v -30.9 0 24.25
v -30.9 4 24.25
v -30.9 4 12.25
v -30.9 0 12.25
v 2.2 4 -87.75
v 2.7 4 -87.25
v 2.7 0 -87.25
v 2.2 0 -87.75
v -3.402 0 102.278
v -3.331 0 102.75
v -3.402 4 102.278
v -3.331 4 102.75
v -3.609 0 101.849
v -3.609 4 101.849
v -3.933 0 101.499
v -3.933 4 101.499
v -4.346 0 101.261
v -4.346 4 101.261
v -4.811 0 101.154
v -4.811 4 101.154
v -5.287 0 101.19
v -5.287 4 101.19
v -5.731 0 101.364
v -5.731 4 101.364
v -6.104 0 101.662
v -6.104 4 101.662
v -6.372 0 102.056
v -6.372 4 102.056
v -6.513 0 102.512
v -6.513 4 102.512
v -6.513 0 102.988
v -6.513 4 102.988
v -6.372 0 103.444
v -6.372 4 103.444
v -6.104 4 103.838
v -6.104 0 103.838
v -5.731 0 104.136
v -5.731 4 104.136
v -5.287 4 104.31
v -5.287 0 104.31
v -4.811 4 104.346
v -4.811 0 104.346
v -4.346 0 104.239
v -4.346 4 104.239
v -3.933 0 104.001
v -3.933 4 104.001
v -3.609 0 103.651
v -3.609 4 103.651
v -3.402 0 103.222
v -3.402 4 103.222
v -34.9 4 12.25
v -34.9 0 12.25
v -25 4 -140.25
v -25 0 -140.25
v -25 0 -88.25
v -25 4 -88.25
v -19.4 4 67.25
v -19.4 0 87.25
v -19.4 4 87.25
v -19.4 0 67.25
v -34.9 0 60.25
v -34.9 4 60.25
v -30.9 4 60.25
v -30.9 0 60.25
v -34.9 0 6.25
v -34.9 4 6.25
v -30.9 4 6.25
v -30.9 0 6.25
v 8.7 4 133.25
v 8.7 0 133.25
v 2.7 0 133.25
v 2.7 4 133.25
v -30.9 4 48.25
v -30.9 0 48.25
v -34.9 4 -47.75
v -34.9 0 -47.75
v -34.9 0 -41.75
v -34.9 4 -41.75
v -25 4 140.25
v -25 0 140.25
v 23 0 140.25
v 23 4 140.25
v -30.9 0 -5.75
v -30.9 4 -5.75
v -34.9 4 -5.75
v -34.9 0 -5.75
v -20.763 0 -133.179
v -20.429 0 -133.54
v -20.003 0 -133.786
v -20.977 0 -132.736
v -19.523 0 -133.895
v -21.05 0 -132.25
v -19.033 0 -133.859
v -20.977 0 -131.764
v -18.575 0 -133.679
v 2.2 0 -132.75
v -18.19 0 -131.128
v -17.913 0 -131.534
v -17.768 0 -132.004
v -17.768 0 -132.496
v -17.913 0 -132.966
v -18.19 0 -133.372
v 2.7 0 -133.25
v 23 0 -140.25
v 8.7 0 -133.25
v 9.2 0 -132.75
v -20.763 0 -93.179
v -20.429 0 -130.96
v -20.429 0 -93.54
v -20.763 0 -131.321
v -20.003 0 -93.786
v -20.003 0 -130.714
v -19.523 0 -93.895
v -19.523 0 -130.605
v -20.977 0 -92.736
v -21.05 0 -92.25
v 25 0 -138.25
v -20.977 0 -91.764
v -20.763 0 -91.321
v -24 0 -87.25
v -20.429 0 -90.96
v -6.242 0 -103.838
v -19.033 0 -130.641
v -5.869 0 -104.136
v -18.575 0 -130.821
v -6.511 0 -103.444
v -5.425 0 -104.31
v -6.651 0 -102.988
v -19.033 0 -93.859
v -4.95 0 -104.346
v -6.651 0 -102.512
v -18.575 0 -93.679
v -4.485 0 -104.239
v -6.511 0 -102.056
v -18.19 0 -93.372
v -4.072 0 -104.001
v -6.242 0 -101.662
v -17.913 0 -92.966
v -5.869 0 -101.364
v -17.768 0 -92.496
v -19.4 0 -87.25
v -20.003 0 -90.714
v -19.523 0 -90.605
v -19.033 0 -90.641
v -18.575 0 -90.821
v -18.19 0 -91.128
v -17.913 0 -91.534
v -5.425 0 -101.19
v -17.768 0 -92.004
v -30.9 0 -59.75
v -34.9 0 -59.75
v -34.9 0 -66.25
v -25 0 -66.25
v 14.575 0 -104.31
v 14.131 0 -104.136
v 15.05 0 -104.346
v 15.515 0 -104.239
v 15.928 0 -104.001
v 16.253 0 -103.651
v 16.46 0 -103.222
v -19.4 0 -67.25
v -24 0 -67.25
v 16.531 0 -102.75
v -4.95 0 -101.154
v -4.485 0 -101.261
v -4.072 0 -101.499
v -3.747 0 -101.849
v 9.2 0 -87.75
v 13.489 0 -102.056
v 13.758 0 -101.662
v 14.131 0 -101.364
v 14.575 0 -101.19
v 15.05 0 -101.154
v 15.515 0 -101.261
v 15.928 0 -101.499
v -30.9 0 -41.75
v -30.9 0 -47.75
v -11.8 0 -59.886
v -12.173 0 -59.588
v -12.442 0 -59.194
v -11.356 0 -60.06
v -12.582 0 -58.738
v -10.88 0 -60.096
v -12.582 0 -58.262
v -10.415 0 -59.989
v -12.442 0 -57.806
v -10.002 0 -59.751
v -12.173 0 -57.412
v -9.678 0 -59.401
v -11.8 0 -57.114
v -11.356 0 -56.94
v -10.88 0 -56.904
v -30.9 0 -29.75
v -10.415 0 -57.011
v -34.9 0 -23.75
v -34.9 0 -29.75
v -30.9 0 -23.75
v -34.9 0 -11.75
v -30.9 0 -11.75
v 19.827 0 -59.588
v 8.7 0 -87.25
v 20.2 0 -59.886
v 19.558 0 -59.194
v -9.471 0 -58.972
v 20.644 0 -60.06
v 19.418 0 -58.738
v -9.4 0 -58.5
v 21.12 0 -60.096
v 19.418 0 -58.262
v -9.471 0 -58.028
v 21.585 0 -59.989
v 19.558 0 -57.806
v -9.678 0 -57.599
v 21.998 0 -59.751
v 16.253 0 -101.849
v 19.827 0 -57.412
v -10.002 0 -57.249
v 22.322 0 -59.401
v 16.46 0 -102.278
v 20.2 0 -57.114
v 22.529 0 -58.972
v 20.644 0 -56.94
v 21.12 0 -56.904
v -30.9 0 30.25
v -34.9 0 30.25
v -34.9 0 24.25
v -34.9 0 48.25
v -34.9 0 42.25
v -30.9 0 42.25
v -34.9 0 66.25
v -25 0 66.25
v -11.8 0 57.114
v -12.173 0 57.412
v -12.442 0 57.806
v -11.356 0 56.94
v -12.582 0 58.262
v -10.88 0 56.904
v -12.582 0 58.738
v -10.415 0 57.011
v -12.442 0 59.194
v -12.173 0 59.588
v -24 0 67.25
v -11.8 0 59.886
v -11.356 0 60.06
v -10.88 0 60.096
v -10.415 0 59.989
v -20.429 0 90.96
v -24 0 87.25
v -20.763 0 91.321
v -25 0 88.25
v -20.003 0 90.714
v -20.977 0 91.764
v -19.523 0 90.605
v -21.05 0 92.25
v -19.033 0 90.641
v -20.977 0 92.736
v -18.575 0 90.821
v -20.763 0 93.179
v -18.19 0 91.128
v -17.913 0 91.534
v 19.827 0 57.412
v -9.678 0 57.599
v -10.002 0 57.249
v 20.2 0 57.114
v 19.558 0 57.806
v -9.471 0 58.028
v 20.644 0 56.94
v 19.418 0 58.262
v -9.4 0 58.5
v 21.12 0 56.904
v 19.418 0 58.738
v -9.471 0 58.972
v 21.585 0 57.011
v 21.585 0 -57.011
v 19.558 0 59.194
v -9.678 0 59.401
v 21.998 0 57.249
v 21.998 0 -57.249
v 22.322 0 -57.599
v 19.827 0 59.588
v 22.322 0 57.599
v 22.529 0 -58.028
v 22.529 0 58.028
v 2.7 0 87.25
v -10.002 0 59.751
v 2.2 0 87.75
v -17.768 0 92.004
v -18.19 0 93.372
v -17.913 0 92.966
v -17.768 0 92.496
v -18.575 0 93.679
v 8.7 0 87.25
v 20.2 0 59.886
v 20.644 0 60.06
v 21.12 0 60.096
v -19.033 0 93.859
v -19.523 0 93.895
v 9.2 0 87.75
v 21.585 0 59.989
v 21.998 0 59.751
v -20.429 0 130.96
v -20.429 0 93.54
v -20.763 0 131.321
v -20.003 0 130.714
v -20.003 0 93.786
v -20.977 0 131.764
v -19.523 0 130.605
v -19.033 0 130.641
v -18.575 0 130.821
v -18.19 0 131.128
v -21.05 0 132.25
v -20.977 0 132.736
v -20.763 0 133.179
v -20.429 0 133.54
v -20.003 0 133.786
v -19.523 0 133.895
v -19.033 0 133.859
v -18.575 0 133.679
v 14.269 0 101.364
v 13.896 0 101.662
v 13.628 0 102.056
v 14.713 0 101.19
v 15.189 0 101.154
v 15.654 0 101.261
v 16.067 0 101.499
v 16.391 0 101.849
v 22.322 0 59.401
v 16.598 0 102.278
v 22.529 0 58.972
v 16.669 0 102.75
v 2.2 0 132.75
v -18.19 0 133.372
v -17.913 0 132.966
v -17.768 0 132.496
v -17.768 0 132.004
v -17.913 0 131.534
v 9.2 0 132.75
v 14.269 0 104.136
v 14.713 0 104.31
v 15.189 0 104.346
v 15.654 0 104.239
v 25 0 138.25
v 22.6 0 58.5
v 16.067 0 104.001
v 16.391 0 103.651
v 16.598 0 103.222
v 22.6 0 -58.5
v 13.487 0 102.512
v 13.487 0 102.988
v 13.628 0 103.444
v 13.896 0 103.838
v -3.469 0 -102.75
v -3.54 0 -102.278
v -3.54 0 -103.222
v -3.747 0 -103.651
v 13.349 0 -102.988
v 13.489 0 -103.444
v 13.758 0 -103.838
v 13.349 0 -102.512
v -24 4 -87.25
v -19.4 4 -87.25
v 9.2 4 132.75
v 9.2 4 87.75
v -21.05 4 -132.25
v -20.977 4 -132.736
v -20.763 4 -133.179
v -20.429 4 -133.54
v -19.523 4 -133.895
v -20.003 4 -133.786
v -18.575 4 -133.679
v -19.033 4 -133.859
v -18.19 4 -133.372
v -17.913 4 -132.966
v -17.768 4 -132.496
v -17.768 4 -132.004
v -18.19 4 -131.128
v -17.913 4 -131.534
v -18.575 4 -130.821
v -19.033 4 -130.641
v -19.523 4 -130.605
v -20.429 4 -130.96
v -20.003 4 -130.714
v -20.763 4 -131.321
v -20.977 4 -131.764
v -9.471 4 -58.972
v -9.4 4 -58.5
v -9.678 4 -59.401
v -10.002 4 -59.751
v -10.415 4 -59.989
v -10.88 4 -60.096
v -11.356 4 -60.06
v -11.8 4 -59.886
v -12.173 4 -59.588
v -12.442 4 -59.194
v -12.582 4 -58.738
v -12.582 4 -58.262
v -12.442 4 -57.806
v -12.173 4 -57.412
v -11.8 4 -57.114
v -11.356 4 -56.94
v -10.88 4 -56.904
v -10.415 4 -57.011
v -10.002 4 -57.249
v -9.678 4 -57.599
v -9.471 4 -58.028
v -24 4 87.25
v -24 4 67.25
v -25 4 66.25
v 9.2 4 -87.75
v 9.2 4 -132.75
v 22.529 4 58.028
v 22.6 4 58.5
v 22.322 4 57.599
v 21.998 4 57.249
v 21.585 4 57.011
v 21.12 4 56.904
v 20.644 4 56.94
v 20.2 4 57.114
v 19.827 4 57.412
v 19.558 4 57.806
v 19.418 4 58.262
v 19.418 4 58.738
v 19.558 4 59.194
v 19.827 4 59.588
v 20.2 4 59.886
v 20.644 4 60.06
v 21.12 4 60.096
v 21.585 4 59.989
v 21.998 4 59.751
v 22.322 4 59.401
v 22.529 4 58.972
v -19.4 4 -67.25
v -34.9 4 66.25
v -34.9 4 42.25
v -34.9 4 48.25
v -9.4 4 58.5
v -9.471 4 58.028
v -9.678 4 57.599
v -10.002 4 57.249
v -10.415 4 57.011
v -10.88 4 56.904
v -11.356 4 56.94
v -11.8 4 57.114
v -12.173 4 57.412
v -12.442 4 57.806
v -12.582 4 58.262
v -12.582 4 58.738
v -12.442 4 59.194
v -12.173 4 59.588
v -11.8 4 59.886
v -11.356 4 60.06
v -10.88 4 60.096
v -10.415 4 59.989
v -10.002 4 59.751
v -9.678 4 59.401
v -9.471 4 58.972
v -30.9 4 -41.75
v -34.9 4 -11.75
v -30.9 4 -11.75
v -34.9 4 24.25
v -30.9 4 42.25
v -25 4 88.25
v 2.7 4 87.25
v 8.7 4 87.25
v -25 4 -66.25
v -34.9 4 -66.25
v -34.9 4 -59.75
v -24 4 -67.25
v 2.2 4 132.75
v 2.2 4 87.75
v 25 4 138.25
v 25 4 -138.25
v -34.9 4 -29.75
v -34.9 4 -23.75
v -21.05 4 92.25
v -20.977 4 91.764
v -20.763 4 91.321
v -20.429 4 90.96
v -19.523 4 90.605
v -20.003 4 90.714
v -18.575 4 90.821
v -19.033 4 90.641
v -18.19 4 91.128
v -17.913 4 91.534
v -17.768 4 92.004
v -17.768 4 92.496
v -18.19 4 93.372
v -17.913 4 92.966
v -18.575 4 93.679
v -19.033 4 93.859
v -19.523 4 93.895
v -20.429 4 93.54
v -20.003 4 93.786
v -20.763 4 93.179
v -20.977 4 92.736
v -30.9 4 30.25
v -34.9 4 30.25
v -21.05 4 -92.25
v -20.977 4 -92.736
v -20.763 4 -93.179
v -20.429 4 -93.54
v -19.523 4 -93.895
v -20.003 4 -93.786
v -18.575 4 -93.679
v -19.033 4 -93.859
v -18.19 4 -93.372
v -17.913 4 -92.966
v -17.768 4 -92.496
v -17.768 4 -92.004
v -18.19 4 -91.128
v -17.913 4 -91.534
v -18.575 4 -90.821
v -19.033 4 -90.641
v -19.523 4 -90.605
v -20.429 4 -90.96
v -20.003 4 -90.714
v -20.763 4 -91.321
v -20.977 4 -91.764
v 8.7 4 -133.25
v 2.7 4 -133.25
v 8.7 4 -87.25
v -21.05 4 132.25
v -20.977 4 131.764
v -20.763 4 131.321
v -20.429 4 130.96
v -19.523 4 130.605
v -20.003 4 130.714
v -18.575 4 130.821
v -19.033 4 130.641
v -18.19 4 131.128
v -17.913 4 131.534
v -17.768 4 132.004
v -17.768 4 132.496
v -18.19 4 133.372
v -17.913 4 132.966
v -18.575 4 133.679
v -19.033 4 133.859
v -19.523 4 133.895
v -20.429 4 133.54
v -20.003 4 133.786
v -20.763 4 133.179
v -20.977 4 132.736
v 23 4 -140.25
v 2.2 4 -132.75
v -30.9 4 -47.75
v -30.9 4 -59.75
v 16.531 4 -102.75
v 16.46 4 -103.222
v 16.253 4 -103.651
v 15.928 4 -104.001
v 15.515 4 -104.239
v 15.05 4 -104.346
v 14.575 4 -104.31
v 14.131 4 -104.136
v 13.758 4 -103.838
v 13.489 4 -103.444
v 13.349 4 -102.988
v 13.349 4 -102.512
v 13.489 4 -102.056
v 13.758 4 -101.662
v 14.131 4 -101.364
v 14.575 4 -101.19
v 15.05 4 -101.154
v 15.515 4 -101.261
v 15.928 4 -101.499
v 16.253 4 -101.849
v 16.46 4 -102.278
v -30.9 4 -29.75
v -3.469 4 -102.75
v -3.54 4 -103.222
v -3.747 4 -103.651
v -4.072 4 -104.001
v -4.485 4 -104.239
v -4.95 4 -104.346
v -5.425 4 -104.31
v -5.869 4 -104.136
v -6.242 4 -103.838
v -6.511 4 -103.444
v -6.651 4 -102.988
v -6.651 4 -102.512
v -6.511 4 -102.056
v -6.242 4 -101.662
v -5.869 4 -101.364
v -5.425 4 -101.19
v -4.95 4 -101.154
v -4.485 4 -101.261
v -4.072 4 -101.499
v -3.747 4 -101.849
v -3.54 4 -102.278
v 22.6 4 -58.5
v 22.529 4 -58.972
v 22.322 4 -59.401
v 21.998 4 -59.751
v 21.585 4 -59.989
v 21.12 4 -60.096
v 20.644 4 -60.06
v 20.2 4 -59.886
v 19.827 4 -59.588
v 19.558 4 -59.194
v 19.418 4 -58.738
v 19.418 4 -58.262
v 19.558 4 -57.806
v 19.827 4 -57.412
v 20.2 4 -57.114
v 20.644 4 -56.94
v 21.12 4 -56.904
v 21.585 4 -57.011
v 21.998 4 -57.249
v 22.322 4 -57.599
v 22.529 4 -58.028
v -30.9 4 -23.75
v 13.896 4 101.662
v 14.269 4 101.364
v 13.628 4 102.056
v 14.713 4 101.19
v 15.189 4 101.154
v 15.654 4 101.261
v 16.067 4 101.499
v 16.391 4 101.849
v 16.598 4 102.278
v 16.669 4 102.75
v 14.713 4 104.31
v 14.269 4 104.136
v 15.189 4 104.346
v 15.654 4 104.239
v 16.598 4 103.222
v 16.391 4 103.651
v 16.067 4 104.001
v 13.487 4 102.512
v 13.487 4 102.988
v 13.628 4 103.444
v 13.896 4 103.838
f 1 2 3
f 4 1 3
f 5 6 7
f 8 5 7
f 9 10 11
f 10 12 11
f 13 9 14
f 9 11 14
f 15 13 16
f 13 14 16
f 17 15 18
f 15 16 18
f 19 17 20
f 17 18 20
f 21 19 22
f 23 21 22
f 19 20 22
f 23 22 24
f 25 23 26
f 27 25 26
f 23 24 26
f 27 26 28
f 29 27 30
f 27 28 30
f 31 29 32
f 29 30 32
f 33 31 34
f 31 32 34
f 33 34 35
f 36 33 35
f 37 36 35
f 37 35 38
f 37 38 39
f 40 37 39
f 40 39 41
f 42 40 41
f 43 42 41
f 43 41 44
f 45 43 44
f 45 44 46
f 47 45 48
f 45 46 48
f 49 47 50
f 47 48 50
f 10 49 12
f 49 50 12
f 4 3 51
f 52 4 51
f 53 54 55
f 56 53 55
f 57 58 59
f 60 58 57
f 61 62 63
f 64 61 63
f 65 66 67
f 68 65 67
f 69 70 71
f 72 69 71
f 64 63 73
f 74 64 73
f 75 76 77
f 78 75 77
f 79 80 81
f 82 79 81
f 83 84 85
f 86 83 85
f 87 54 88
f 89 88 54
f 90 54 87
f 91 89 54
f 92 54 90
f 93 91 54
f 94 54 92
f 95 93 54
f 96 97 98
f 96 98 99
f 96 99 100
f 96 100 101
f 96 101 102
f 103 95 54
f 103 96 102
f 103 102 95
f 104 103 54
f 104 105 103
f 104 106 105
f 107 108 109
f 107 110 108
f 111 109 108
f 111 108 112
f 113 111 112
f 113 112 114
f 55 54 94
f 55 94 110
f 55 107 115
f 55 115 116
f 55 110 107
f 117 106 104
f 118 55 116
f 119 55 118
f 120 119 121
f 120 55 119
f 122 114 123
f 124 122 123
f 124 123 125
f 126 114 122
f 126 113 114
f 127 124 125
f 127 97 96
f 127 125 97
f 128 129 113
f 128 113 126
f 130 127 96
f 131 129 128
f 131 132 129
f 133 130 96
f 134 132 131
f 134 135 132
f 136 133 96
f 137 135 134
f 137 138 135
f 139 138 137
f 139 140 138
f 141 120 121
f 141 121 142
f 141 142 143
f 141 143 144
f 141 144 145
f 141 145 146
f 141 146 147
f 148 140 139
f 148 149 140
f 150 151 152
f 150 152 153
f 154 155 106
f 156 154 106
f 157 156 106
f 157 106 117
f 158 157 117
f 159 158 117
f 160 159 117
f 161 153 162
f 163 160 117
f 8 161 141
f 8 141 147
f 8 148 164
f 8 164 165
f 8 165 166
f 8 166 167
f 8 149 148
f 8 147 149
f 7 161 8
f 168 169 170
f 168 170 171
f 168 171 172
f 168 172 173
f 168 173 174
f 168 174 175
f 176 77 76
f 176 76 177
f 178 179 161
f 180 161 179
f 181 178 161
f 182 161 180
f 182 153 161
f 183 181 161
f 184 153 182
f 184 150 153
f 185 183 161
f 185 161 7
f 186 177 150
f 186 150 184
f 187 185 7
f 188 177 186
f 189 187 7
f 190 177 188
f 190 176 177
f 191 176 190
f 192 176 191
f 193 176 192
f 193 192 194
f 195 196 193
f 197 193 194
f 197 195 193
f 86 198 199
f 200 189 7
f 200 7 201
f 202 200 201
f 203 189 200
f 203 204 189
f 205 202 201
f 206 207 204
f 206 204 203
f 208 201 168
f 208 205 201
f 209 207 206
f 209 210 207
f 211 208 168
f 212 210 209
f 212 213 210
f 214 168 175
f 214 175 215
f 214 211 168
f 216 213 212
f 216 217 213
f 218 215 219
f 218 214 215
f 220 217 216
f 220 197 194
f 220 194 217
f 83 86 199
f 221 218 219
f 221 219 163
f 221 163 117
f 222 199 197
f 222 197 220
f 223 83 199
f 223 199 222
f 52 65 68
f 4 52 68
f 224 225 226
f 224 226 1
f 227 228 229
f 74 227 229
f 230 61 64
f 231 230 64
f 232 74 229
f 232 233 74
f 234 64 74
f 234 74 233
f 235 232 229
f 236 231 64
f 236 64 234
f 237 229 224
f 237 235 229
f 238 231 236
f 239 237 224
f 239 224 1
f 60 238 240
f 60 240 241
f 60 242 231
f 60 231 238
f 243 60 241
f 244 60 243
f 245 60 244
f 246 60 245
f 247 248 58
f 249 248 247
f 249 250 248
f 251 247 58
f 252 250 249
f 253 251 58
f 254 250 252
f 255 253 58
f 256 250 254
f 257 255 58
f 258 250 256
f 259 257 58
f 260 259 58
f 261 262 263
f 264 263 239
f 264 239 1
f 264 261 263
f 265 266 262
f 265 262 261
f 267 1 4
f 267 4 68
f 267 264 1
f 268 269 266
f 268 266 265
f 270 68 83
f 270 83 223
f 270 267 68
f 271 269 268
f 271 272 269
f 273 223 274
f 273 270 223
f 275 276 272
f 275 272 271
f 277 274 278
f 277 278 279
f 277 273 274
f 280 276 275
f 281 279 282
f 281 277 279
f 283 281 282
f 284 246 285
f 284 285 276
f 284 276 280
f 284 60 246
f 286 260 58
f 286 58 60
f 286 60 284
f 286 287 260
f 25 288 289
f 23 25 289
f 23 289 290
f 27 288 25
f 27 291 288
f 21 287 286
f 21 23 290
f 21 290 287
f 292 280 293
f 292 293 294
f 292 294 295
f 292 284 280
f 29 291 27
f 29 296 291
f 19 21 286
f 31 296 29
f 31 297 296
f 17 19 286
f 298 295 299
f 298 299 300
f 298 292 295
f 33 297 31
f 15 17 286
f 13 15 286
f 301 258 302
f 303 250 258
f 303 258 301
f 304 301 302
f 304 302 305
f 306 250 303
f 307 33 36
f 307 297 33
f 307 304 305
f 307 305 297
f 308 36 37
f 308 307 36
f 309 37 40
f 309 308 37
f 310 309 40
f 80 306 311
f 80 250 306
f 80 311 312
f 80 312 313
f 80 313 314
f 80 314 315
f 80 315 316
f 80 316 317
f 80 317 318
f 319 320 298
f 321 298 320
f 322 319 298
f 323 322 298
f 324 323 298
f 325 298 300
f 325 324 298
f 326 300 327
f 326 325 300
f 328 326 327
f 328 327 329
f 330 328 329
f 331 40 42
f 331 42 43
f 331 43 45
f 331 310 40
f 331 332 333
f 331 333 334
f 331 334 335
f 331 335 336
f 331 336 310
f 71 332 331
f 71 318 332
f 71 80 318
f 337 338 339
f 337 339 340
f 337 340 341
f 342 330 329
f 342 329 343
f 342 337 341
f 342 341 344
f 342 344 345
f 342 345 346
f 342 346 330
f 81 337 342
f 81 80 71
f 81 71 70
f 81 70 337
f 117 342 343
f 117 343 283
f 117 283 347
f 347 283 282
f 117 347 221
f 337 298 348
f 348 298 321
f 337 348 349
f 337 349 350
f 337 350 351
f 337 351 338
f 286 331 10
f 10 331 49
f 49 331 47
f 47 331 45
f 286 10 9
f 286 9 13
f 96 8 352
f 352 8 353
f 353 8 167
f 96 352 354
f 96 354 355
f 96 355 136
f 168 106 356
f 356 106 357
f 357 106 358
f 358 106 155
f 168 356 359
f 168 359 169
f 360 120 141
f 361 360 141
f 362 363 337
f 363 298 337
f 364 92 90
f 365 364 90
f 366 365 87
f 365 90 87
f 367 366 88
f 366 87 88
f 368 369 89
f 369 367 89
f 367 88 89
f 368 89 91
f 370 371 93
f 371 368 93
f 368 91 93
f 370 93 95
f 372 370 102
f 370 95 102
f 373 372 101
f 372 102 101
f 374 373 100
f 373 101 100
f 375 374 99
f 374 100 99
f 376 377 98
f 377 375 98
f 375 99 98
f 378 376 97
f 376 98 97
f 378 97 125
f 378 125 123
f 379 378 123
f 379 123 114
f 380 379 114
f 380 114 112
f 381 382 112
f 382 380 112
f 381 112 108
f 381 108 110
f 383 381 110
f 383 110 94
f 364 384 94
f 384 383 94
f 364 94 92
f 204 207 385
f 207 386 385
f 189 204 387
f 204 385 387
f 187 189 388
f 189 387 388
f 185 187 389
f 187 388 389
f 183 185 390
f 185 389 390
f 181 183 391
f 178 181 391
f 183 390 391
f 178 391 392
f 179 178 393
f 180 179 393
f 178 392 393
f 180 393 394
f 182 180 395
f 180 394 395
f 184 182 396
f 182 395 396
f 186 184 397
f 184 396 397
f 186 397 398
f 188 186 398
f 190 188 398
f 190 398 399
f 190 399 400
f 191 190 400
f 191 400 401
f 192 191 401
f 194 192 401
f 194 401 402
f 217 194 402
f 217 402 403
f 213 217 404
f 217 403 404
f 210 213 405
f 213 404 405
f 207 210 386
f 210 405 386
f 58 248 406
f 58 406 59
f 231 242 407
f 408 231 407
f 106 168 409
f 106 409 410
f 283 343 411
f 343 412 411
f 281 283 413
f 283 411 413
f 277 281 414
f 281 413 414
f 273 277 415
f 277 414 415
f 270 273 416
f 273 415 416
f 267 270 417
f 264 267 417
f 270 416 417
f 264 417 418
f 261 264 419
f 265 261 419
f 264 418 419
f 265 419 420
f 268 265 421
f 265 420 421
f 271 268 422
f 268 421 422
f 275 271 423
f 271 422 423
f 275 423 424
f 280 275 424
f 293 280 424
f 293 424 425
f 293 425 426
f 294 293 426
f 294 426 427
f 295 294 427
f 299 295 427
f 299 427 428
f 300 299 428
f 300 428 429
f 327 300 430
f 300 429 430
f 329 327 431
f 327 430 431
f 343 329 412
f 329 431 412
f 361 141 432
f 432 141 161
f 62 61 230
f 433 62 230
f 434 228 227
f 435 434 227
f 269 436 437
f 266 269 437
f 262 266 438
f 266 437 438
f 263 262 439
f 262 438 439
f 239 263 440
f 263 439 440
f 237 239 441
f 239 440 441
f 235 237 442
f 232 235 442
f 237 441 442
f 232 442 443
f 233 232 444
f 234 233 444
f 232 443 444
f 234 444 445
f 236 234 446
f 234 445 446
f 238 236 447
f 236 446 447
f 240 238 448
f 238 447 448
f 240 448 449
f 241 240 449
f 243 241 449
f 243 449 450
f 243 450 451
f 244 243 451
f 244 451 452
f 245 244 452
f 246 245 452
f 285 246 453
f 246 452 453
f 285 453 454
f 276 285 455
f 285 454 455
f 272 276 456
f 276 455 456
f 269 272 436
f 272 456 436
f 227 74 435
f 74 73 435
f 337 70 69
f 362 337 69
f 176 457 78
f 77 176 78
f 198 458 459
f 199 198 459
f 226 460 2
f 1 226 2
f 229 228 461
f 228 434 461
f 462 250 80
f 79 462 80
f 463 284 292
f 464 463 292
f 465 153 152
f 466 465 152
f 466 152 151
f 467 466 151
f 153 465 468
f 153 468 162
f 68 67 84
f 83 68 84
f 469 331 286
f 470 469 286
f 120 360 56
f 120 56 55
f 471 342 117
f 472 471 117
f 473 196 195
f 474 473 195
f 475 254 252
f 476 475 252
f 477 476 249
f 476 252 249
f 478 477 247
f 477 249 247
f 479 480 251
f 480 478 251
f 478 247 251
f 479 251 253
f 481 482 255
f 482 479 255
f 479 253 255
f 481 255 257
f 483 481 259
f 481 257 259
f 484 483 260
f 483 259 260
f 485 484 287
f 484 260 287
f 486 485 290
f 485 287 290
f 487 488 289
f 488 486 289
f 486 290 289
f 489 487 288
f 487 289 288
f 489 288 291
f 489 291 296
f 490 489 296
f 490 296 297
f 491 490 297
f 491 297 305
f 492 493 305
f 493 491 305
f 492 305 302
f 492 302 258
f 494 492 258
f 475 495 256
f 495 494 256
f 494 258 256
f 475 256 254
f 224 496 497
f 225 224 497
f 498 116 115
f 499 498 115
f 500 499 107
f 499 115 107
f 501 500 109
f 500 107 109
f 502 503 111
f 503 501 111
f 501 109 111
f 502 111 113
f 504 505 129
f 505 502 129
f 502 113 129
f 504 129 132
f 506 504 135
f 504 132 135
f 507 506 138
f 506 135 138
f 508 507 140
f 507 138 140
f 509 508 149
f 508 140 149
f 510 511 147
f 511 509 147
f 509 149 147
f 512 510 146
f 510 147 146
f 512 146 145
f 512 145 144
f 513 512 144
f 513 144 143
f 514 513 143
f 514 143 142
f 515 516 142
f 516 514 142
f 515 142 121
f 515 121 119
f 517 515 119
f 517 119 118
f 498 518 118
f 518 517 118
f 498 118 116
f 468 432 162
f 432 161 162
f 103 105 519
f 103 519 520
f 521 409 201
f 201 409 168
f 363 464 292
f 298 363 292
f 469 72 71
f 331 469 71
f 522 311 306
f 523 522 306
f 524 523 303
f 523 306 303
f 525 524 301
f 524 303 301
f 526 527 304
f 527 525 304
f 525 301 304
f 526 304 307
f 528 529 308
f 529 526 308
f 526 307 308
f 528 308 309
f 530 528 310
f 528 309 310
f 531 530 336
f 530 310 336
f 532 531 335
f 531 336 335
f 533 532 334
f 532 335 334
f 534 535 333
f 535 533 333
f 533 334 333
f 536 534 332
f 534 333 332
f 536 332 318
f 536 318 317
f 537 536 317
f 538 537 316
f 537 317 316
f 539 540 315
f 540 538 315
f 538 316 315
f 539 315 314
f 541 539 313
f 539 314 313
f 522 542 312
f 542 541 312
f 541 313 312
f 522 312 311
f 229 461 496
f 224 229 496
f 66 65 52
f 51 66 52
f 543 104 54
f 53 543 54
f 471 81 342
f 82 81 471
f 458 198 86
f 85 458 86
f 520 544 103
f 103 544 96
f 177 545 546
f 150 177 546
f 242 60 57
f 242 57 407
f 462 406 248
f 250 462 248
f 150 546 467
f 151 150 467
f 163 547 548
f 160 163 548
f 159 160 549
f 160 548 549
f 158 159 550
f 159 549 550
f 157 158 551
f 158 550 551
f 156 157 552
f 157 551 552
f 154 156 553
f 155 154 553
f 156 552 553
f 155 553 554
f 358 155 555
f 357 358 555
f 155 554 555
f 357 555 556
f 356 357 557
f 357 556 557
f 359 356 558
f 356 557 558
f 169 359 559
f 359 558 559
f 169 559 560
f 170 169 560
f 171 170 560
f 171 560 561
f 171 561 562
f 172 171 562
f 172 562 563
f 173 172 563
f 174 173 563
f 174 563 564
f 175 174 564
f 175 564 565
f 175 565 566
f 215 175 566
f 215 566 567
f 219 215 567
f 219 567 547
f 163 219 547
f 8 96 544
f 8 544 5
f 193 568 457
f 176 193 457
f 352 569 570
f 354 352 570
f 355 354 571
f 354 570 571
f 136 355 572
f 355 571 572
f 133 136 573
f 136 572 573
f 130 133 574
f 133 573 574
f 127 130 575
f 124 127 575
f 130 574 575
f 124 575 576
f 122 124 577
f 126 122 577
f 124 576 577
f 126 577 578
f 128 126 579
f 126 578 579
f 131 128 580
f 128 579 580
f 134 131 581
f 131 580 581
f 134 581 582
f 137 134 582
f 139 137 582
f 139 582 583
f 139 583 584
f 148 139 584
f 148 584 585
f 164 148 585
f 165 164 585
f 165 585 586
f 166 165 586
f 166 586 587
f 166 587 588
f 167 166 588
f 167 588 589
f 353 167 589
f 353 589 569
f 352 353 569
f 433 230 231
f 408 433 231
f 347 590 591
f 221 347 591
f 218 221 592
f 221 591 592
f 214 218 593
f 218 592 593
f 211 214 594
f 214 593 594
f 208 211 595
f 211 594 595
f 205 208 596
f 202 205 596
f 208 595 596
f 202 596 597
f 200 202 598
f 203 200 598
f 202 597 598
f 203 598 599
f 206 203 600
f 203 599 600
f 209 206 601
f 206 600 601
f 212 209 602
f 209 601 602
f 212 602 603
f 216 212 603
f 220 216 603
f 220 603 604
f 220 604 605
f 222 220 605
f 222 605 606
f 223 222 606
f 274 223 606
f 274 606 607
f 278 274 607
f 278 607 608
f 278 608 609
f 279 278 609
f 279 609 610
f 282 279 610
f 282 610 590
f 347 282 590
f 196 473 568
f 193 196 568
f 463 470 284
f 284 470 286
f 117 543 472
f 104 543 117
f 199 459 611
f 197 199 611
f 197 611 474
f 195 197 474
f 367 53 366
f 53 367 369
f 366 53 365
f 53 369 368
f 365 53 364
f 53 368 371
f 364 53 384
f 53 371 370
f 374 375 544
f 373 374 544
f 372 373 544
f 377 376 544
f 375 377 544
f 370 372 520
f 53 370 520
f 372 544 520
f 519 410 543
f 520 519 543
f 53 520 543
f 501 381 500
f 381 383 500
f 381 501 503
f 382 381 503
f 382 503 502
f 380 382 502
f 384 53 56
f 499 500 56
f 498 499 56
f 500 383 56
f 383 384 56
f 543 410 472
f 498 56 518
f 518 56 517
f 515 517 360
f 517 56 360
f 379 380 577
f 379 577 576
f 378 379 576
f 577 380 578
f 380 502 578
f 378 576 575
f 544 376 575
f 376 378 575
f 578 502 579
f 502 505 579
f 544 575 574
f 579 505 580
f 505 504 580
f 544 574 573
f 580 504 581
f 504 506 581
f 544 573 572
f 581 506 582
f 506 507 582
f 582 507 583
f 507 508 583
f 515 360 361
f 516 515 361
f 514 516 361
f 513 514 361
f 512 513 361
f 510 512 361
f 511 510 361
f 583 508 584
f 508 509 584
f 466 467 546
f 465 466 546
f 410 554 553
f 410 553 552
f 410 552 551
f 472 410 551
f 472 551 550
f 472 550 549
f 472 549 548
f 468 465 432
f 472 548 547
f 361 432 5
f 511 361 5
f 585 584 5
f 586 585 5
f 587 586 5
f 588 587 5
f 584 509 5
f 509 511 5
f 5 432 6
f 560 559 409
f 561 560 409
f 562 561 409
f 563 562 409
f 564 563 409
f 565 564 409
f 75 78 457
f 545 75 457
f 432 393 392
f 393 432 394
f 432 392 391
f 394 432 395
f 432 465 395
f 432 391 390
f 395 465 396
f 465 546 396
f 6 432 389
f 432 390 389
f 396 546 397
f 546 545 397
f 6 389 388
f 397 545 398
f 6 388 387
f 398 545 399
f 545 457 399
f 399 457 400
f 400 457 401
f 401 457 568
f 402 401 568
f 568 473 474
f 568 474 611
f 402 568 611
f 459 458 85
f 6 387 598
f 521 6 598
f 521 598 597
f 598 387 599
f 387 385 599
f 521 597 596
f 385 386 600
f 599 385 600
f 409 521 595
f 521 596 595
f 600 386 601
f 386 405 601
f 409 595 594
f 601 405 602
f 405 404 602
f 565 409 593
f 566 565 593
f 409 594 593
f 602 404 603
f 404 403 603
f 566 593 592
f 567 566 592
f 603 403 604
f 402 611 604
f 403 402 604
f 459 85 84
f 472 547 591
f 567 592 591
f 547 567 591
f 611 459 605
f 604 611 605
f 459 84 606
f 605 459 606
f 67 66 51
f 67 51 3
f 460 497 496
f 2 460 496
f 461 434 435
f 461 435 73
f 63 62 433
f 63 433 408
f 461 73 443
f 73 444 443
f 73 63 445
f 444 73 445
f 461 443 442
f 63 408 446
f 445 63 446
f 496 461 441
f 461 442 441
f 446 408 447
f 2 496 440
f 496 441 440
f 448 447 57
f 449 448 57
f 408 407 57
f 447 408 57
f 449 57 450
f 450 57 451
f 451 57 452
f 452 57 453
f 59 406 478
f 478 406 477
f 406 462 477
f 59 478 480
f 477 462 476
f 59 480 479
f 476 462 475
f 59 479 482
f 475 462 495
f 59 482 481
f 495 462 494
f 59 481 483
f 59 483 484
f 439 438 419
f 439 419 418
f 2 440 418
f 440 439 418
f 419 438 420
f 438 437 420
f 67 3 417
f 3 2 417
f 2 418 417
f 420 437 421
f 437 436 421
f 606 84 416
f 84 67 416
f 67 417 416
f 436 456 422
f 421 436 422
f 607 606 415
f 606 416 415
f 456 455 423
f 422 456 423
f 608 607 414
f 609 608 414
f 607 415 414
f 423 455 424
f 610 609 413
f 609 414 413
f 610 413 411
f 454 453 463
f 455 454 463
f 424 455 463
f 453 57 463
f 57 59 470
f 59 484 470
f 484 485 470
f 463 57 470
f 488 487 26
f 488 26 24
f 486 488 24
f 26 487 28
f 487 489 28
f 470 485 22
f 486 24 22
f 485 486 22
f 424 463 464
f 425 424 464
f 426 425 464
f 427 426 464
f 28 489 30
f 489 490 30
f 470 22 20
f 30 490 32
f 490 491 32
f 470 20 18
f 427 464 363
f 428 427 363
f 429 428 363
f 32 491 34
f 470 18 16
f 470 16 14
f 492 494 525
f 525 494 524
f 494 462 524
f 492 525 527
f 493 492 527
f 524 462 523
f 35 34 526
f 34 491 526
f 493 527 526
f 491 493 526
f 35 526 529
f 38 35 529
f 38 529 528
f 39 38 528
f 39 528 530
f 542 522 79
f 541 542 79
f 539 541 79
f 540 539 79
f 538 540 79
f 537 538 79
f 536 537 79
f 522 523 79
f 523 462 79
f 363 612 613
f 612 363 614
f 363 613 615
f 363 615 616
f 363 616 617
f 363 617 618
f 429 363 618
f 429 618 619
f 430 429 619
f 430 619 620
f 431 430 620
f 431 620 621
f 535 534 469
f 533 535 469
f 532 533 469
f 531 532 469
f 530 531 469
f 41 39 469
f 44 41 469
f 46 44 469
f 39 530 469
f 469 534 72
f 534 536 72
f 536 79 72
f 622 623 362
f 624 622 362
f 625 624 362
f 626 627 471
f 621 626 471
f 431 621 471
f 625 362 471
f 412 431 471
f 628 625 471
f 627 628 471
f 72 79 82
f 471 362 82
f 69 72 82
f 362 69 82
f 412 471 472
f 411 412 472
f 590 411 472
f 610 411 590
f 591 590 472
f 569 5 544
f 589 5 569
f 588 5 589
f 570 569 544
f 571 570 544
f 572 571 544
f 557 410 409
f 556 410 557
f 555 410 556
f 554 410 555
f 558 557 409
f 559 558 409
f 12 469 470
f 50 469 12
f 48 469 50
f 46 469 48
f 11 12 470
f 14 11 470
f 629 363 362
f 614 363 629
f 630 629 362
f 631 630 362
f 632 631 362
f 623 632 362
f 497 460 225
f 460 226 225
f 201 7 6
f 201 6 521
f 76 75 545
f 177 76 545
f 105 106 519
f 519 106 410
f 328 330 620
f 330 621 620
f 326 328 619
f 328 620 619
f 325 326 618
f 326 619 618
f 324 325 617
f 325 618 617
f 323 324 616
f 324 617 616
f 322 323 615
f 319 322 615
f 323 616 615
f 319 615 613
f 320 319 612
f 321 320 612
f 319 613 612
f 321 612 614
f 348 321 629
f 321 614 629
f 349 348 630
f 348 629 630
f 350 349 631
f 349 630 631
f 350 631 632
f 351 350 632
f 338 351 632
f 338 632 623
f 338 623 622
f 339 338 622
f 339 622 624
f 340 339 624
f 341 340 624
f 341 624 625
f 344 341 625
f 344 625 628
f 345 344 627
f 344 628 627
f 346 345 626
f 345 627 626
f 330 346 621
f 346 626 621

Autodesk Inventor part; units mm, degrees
ref_plane "YZ Plane" through (0, 0, 0) normal (1, 0, 0) x (0, 1, 0)
ref_plane "XZ Plane" through (0, 0, 0) normal (0, 1, 0) x (-1, 0, 0)
ref_plane "XY Plane" through (0, 0, 0) normal (0, 0, 1) x (1, 0, 0)
sketch "Эскиз1" plane through (0, 0, 0) normal (0, 1, 0) x (-1, 0, 0)
  line L0 (-25, -140.25) -> (25, -140.25)
  line L1 (25, -140.25) -> (25, 140.25)
  line L2 (25, 140.25) -> (-25, 140.25)
  line L3 (-25, 140.25) -> (-25, -140.25)
  line L4 (-25, -140.25) -> (25, 140.25) construction
  line L5 (25, -140.25) -> (-25, 140.25) construction
  circle A0 centre (19.4, 132.25) radius 1.65
  circle A1 centre (19.4, 92.25) radius 1.65
  line L6 (-25, 0) -> (0, 0)
  line L7 (25, 87.25) -> (19.4, 87.25)
  line L8 (19.4, 87.25) -> (19.4, 67.25)
  line L9 (19.4, 67.25) -> (25, 67.25)
  line L10 (25, 67.25) -> (25, 87.25)
  line L11 (-9.2, 133.25) -> (-2.2, 133.25)
  line L12 (-2.2, 133.25) -> (-2.2, 87.25)
  line L13 (-2.2, 87.25) -> (-9.2, 87.25)
  line L14 (-9.2, 87.25) -> (-9.2, 133.25)
  circle A2 centre (19.4, -132.25) radius 1.65
  circle A3 centre (19.4, -92.25) radius 1.65
  line L15 (25, -87.25) -> (19.4, -87.25)
  line L16 (19.4, -87.25) -> (19.4, -67.25)
  line L17 (19.4, -67.25) -> (25, -67.25)
  line L18 (-9.2, -133.25) -> (-2.2, -133.25)
  line L19 (-2.2, -133.25) -> (-2.2, -87.25)
  line L20 (-2.2, -87.25) -> (-9.2, -87.25)
  line L21 (-9.2, -87.25) -> (-9.2, -133.25)
  point P0 (25, -87.25)
  point P1 (25, -67.25)
  dimension "d0" = 50
  dimension "d1" = 280.5
  dimension "d2" = 3.3
  dimension "d3" = 3.3
  dimension "d4" = 5.6
  dimension "d5" = 5.6
  dimension "d6" = 8
  dimension "d7" = 40
  dimension "d8" = 20
  dimension "d9" = 5
  dimension "d10" = 5.6
  dimension "d11" = 7
  dimension "d12" = 46
  dimension "d13" = 7
  dimension "d17" = 28.6
extrude "Выдавливание1" add sketch "Эскиз1" along normal blind 4 contours L3 L2 L1 L7 L8 L9 L17 L16 L15 L0
chamfer "Фаска1" distance 2 angle 45 2 edges at (25, 2, -140.25) (25, 2, 140.25)
chamfer "Фаска2" distance 0.5 angle 45 8 edges at (9.2, 2, 87.25) (2.2, 2, 87.25) (9.2, 2, 133.25) (2.2, 2, 133.25) (2.2, 2, -87.25) (2.2, 2, -133.25) (9.2, 2, -133.25) (9.2, 2, -87.25)
chamfer "Фаска3" distance 1 angle 45 4 edges at (-25, 2, -87.25) (-25, 2, -67.25) (-25, 2, 87.25) (-25, 2, 67.25)
sketch "Эскиз2" plane through (0, 0, 0) normal (0, -1, 0) x (1, 0, 0)
  line L0 (-25, -66.25) -> (-25, 66.25) projected
  line L1 (-25, -66.25) -> (-34.9, -66.25)
  line L2 (-34.9, -66.25) -> (-34.9, 66.25)
  line L3 (-34.9, 66.25) -> (-25, 66.25)
  line L4 (-25, 66.25) -> (-25, -66.25)
  point P0 (0, 0)
  dimension "d27" = 9.9
extrude "Выдавливание2" add sketch "Эскиз2" against normal blind 4
sketch "Эскиз3" plane through (0, 4, 0) normal (0, 1, 0) x (1, 0, 0)
  line L0 (-34.9, -66.25) -> (-34.9, 66.25) projected
  line L1 (-34.9, -60.25) -> (-30.9, -60.25)
  line L2 (-30.9, -60.25) -> (-30.9, -48.25)
  line L3 (-30.9, -48.25) -> (-34.9, -48.25)
  line L4 (-34.9, -48.25) -> (-34.9, -60.25)
  line L5 (-34.9, -66.25) -> (-25, -66.25) projected
  line L6 (-34.9, -42.25) -> (-30.9, -42.25)
  line L7 (-30.9, -42.25) -> (-30.9, -30.25)
  line L8 (-30.9, -30.25) -> (-34.9, -30.25)
  line L9 (-34.9, -30.25) -> (-34.9, -42.25)
  line L10 (-34.9, -24.25) -> (-30.9, -24.25)
  line L11 (-30.9, -24.25) -> (-30.9, -12.25)
  line L12 (-30.9, -12.25) -> (-34.9, -12.25)
  line L13 (-34.9, -12.25) -> (-34.9, -24.25)
  line L14 (-34.9, -6.25) -> (-30.9, -6.25)
  line L15 (-30.9, -6.25) -> (-30.9, 5.75)
  line L16 (-30.9, 5.75) -> (-34.9, 5.75)
  line L17 (-34.9, 5.75) -> (-34.9, -6.25)
  line L18 (-34.9, 11.75) -> (-30.9, 11.75)
  line L19 (-30.9, 11.75) -> (-30.9, 23.75)
  line L20 (-30.9, 23.75) -> (-34.9, 23.75)
  line L21 (-34.9, 23.75) -> (-34.9, 11.75)
  line L22 (-34.9, 29.75) -> (-30.9, 29.75)
  line L23 (-30.9, 29.75) -> (-30.9, 41.75)
  line L24 (-30.9, 41.75) -> (-34.9, 41.75)
  line L25 (-34.9, 41.75) -> (-34.9, 29.75)
  line L26 (-34.9, 47.75) -> (-30.9, 47.75)
  line L27 (-30.9, 47.75) -> (-30.9, 59.75)
  line L28 (-30.9, 59.75) -> (-34.9, 59.75)
  line L29 (-34.9, 59.75) -> (-34.9, 47.75)
  point P0 (0, 0)
  point P1 (-32.9, -60.25)
  point P2 (-32.9, -42.25)
  point P3 (-32.9, -24.25)
  point P4 (-32.9, -6.25)
  point P5 (-32.9, 11.75)
  point P6 (-32.9, 29.75)
  point P7 (-32.9, 47.75)
  dimension "d32" = 4
  dimension "d33" = 12
  dimension "d34" = 6
  dimension "d37" = 18
extrude "Выдавливание3" cut sketch "Эскиз3" against normal blind 4
sketch "Эскиз4" plane through (0, 4, 0) normal (0, 1, 0) x (1, 0, 0)
  circle A0 centre (-4.9309, -102.75) radius 1.6 projected
  circle A1 centre (15.0691, -102.75) radius 1.6 projected
  circle A2 centre (-5.0691, 102.75) radius 1.6 projected
  circle A3 centre (14.9309, 102.75) radius 1.6 projected
  point P0 (0, 0)
extrude "Выдавливание4" cut sketch "Эскиз4" against normal blind 10
sketch "Эскиз5" plane through (0, 4, 0) normal (0, 1, 0) x (1, 0, 0)
  circle A0 centre (21, -58.5) radius 1.6 projected
  circle A1 centre (-11, -58.5) radius 1.6 projected
  circle A2 centre (21, 58.5) radius 1.6 projected
  circle A3 centre (-11, 58.5) radius 1.6 projected
  point P0 (0, 0)
extrude "Выдавливание5" cut sketch "Эскиз5" against normal blind 10
properties part number "фанера_жлектроника_новая"
